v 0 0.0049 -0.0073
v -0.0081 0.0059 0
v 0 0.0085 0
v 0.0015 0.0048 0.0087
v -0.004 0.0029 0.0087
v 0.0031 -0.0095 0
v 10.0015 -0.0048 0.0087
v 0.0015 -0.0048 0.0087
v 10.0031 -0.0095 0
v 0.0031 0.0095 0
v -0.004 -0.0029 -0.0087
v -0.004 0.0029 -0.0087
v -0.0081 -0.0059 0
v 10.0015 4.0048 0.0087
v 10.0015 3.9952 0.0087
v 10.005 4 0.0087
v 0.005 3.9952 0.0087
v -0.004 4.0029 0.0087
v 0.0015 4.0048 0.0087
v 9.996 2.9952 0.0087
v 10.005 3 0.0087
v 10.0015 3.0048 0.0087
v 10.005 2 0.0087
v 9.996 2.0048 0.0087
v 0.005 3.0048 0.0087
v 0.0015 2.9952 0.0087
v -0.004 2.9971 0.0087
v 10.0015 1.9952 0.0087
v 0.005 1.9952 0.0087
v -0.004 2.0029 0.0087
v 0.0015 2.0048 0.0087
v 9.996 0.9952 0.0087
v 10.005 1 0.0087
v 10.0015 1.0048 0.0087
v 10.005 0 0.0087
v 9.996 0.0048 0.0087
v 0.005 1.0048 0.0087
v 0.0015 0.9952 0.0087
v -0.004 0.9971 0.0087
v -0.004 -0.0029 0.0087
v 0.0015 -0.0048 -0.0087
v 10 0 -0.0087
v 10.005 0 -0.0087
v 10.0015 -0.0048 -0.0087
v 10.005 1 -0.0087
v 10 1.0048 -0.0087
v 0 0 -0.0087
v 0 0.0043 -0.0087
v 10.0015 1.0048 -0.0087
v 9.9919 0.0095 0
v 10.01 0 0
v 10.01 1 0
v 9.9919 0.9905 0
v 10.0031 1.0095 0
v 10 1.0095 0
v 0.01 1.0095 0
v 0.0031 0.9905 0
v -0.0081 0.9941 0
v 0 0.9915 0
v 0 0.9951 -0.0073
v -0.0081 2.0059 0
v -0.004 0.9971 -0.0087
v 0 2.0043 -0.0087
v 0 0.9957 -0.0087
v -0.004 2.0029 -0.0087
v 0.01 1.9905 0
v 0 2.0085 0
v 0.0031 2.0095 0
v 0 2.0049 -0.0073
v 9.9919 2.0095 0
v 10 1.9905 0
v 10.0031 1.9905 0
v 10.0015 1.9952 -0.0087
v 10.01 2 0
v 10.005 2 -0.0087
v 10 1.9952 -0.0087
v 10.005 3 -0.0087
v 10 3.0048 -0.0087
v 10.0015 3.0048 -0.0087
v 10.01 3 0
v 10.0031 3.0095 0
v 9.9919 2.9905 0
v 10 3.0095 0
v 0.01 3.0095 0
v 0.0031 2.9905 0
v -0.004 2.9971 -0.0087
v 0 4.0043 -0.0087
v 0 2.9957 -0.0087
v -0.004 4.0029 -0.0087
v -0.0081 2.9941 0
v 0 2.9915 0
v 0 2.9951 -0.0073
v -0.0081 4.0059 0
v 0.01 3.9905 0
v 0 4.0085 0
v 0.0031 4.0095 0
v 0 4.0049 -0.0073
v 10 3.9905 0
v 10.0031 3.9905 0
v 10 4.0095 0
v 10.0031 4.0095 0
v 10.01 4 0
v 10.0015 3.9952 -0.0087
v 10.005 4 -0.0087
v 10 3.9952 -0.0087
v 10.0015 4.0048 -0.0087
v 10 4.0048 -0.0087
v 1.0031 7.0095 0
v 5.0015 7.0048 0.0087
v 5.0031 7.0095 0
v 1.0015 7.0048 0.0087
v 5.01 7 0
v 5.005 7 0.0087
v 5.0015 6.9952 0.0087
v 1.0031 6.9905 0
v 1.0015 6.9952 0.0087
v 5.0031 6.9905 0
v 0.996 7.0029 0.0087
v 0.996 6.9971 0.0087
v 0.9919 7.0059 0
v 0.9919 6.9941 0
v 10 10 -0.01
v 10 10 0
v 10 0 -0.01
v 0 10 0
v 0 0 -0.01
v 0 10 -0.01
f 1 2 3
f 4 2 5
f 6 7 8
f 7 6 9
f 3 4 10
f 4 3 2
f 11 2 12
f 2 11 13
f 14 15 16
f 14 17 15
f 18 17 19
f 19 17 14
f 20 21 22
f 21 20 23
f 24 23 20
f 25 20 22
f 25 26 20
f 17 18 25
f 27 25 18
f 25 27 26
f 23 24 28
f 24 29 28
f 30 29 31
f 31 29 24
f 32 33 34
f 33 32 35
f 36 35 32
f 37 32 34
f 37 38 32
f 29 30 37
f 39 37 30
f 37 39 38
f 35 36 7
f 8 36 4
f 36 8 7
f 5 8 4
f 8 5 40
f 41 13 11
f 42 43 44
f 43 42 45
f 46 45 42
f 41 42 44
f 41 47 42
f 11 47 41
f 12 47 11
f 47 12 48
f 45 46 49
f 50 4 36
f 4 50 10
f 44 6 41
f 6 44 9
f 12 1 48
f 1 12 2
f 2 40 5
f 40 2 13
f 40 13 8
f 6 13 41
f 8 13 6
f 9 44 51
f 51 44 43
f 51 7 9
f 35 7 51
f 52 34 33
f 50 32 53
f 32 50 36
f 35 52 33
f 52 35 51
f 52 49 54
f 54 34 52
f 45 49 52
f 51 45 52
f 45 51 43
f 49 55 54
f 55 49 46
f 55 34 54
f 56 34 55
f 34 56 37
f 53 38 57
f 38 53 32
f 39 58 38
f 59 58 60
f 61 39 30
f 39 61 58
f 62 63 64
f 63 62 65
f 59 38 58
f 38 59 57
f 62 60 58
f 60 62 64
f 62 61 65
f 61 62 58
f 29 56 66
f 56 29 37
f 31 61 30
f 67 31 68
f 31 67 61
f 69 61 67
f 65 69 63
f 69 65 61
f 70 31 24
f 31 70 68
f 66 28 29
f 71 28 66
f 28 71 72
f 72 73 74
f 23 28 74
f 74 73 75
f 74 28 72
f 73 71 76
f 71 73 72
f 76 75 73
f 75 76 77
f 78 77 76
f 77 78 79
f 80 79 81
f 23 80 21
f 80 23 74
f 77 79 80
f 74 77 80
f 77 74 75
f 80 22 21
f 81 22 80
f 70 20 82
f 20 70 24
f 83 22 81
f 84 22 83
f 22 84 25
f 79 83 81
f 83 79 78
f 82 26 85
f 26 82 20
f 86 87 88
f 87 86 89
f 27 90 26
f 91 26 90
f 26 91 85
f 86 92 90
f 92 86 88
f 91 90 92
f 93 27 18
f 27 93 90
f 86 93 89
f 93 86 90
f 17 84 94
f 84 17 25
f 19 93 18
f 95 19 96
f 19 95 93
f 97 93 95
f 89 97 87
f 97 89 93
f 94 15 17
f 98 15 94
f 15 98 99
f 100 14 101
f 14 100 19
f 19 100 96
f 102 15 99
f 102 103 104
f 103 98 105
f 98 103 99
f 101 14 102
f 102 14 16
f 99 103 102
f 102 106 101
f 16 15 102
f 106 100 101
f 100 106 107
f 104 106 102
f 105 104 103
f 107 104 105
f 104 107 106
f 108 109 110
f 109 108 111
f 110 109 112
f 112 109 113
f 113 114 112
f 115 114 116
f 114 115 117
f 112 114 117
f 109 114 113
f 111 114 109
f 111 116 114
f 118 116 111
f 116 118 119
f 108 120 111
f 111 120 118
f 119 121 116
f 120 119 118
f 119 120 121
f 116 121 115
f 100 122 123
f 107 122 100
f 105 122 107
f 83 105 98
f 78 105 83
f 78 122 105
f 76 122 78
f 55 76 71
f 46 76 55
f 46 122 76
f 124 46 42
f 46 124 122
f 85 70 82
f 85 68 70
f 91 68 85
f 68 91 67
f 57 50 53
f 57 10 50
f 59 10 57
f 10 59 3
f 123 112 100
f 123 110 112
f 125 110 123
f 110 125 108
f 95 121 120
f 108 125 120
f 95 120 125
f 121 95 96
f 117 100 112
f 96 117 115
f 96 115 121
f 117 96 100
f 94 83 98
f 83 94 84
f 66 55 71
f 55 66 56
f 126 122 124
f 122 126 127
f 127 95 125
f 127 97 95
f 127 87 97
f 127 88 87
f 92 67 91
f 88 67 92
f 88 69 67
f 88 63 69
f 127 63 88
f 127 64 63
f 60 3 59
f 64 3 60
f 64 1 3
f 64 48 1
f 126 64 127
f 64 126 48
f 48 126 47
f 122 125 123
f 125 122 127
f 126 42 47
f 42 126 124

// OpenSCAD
hull(){
    translate([0.0, 0.0]) sphere(0.01);
    translate([1.0, 0.0]) sphere(0.01);
}
hull(){
    translate([1.0, 0.0]) sphere(0.01);
    translate([2.0, 0.0]) sphere(0.01);
}
hull(){
    translate([2.0, 0.0]) sphere(0.01);
    translate([3.0, 0.0]) sphere(0.01);
}
hull(){
    translate([3.0, 0.0]) sphere(0.01);
    translate([4.0, 0.0]) sphere(0.01);
}
hull(){
    translate([4.0, 0.0]) sphere(0.01);
    translate([5.0, 0.0]) sphere(0.01);
}
hull(){
    translate([5.0, 0.0]) sphere(0.01);
    translate([6.0, 0.0]) sphere(0.01);
}
hull(){
    translate([6.0, 0.0]) sphere(0.01);
    translate([7.0, 0.0]) sphere(0.01);
}
hull(){
    translate([7.0, 0.0]) sphere(0.01);
    translate([8.0, 0.0]) sphere(0.01);
}
hull(){
    translate([8.0, 0.0]) sphere(0.01);
    translate([9.0, 0.0]) sphere(0.01);
}
hull(){
    translate([9.0, 0.0]) sphere(0.01);
    translate([10.0, 0.0]) sphere(0.01);
}
hull(){
    translate([10.0, 0.0]) sphere(0.01);
    translate([10.0, 1.0]) sphere(0.01);
}
hull(){
    translate([10.0, 1.0]) sphere(0.01);
    translate([9.0, 1.0]) sphere(0.01);
}
hull(){
    translate([9.0, 1.0]) sphere(0.01);
    translate([8.0, 1.0]) sphere(0.01);
}
hull(){
    translate([8.0, 1.0]) sphere(0.01);
    translate([7.0, 1.0]) sphere(0.01);
}
hull(){
    translate([7.0, 1.0]) sphere(0.01);
    translate([6.0, 1.0]) sphere(0.01);
}
hull(){
    translate([6.0, 1.0]) sphere(0.01);
    translate([5.0, 1.0]) sphere(0.01);
}
hull(){
    translate([5.0, 1.0]) sphere(0.01);
    translate([4.0, 1.0]) sphere(0.01);
}
hull(){
    translate([4.0, 1.0]) sphere(0.01);
    translate([3.0, 1.0]) sphere(0.01);
}
hull(){
    translate([3.0, 1.0]) sphere(0.01);
    translate([2.0, 1.0]) sphere(0.01);
}
hull(){
    translate([2.0, 1.0]) sphere(0.01);
    translate([1.0, 1.0]) sphere(0.01);
}
hull(){
    translate([1.0, 1.0]) sphere(0.01);
    translate([0.0, 1.0]) sphere(0.01);
}
hull(){
    translate([0.0, 1.0]) sphere(0.01);
    translate([0.0, 2.0]) sphere(0.01);
}
hull(){
    translate([0.0, 2.0]) sphere(0.01);
    translate([1.0, 2.0]) sphere(0.01);
}
hull(){
    translate([1.0, 2.0]) sphere(0.01);
    translate([2.0, 2.0]) sphere(0.01);
}
hull(){
    translate([2.0, 2.0]) sphere(0.01);
    translate([3.0, 2.0]) sphere(0.01);
}
hull(){
    translate([3.0, 2.0]) sphere(0.01);
    translate([4.0, 2.0]) sphere(0.01);
}
hull(){
    translate([4.0, 2.0]) sphere(0.01);
    translate([5.0, 2.0]) sphere(0.01);
}
hull(){
    translate([5.0, 2.0]) sphere(0.01);
    translate([6.0, 2.0]) sphere(0.01);
}
hull(){
    translate([6.0, 2.0]) sphere(0.01);
    translate([7.0, 2.0]) sphere(0.01);
}
hull(){
    translate([7.0, 2.0]) sphere(0.01);
    translate([8.0, 2.0]) sphere(0.01);
}
hull(){
    translate([8.0, 2.0]) sphere(0.01);
    translate([9.0, 2.0]) sphere(0.01);
}
hull(){
    translate([9.0, 2.0]) sphere(0.01);
    translate([10.0, 2.0]) sphere(0.01);
}
hull(){
    translate([10.0, 2.0]) sphere(0.01);
    translate([10.0, 3.0]) sphere(0.01);
}
hull(){
    translate([10.0, 3.0]) sphere(0.01);
    translate([9.0, 3.0]) sphere(0.01);
}
hull(){
    translate([9.0, 3.0]) sphere(0.01);
    translate([8.0, 3.0]) sphere(0.01);
}
hull(){
    translate([8.0, 3.0]) sphere(0.01);
    translate([7.0, 3.0]) sphere(0.01);
}
hull(){
    translate([7.0, 3.0]) sphere(0.01);
    translate([6.0, 3.0]) sphere(0.01);
}
hull(){
    translate([6.0, 3.0]) sphere(0.01);
    translate([5.0, 3.0]) sphere(0.01);
}
hull(){
    translate([5.0, 3.0]) sphere(0.01);
    translate([4.0, 3.0]) sphere(0.01);
}
hull(){
    translate([4.0, 3.0]) sphere(0.01);
    translate([3.0, 3.0]) sphere(0.01);
}
hull(){
    translate([3.0, 3.0]) sphere(0.01);
    translate([2.0, 3.0]) sphere(0.01);
}
hull(){
    translate([2.0, 3.0]) sphere(0.01);
    translate([1.0, 3.0]) sphere(0.01);
}
hull(){
    translate([1.0, 3.0]) sphere(0.01);
    translate([0.0, 3.0]) sphere(0.01);
}
hull(){
    translate([0.0, 3.0]) sphere(0.01);
    translate([0.0, 4.0]) sphere(0.01);
}
hull(){
    translate([0.0, 4.0]) sphere(0.01);
    translate([1.0, 4.0]) sphere(0.01);
}
hull(){
    translate([1.0, 4.0]) sphere(0.01);
    translate([2.0, 4.0]) sphere(0.01);
}
hull(){
    translate([2.0, 4.0]) sphere(0.01);
    translate([3.0, 4.0]) sphere(0.01);
}
hull(){
    translate([3.0, 4.0]) sphere(0.01);
    translate([4.0, 4.0]) sphere(0.01);
}
hull(){
    translate([4.0, 4.0]) sphere(0.01);
    translate([5.0, 4.0]) sphere(0.01);
}
hull(){
    translate([5.0, 4.0]) sphere(0.01);
    translate([6.0, 4.0]) sphere(0.01);
}
hull(){
    translate([6.0, 4.0]) sphere(0.01);
    translate([7.0, 4.0]) sphere(0.01);
}
hull(){
    translate([7.0, 4.0]) sphere(0.01);
    translate([8.0, 4.0]) sphere(0.01);
}
hull(){
    translate([8.0, 4.0]) sphere(0.01);
    translate([9.0, 4.0]) sphere(0.01);
}
hull(){
    translate([9.0, 4.0]) sphere(0.01);
    translate([10.0, 4.0]) sphere(0.01);
}
hull(){
    translate([5.0, 7.0]) sphere(0.01);
    translate([4.0, 7.0]) sphere(0.01);
}
hull(){
    translate([4.0, 7.0]) sphere(0.01);
    translate([3.0, 7.0]) sphere(0.01);
}
hull(){
    translate([3.0, 7.0]) sphere(0.01);
    translate([2.0, 7.0]) sphere(0.01);
}
hull(){
    translate([2.0, 7.0]) sphere(0.01);
    translate([1.0, 7.0]) sphere(0.01);
}
translate([0,0,-0.01]) color([0.1,0.1,0.1]) cube([10,10,0.01]);
